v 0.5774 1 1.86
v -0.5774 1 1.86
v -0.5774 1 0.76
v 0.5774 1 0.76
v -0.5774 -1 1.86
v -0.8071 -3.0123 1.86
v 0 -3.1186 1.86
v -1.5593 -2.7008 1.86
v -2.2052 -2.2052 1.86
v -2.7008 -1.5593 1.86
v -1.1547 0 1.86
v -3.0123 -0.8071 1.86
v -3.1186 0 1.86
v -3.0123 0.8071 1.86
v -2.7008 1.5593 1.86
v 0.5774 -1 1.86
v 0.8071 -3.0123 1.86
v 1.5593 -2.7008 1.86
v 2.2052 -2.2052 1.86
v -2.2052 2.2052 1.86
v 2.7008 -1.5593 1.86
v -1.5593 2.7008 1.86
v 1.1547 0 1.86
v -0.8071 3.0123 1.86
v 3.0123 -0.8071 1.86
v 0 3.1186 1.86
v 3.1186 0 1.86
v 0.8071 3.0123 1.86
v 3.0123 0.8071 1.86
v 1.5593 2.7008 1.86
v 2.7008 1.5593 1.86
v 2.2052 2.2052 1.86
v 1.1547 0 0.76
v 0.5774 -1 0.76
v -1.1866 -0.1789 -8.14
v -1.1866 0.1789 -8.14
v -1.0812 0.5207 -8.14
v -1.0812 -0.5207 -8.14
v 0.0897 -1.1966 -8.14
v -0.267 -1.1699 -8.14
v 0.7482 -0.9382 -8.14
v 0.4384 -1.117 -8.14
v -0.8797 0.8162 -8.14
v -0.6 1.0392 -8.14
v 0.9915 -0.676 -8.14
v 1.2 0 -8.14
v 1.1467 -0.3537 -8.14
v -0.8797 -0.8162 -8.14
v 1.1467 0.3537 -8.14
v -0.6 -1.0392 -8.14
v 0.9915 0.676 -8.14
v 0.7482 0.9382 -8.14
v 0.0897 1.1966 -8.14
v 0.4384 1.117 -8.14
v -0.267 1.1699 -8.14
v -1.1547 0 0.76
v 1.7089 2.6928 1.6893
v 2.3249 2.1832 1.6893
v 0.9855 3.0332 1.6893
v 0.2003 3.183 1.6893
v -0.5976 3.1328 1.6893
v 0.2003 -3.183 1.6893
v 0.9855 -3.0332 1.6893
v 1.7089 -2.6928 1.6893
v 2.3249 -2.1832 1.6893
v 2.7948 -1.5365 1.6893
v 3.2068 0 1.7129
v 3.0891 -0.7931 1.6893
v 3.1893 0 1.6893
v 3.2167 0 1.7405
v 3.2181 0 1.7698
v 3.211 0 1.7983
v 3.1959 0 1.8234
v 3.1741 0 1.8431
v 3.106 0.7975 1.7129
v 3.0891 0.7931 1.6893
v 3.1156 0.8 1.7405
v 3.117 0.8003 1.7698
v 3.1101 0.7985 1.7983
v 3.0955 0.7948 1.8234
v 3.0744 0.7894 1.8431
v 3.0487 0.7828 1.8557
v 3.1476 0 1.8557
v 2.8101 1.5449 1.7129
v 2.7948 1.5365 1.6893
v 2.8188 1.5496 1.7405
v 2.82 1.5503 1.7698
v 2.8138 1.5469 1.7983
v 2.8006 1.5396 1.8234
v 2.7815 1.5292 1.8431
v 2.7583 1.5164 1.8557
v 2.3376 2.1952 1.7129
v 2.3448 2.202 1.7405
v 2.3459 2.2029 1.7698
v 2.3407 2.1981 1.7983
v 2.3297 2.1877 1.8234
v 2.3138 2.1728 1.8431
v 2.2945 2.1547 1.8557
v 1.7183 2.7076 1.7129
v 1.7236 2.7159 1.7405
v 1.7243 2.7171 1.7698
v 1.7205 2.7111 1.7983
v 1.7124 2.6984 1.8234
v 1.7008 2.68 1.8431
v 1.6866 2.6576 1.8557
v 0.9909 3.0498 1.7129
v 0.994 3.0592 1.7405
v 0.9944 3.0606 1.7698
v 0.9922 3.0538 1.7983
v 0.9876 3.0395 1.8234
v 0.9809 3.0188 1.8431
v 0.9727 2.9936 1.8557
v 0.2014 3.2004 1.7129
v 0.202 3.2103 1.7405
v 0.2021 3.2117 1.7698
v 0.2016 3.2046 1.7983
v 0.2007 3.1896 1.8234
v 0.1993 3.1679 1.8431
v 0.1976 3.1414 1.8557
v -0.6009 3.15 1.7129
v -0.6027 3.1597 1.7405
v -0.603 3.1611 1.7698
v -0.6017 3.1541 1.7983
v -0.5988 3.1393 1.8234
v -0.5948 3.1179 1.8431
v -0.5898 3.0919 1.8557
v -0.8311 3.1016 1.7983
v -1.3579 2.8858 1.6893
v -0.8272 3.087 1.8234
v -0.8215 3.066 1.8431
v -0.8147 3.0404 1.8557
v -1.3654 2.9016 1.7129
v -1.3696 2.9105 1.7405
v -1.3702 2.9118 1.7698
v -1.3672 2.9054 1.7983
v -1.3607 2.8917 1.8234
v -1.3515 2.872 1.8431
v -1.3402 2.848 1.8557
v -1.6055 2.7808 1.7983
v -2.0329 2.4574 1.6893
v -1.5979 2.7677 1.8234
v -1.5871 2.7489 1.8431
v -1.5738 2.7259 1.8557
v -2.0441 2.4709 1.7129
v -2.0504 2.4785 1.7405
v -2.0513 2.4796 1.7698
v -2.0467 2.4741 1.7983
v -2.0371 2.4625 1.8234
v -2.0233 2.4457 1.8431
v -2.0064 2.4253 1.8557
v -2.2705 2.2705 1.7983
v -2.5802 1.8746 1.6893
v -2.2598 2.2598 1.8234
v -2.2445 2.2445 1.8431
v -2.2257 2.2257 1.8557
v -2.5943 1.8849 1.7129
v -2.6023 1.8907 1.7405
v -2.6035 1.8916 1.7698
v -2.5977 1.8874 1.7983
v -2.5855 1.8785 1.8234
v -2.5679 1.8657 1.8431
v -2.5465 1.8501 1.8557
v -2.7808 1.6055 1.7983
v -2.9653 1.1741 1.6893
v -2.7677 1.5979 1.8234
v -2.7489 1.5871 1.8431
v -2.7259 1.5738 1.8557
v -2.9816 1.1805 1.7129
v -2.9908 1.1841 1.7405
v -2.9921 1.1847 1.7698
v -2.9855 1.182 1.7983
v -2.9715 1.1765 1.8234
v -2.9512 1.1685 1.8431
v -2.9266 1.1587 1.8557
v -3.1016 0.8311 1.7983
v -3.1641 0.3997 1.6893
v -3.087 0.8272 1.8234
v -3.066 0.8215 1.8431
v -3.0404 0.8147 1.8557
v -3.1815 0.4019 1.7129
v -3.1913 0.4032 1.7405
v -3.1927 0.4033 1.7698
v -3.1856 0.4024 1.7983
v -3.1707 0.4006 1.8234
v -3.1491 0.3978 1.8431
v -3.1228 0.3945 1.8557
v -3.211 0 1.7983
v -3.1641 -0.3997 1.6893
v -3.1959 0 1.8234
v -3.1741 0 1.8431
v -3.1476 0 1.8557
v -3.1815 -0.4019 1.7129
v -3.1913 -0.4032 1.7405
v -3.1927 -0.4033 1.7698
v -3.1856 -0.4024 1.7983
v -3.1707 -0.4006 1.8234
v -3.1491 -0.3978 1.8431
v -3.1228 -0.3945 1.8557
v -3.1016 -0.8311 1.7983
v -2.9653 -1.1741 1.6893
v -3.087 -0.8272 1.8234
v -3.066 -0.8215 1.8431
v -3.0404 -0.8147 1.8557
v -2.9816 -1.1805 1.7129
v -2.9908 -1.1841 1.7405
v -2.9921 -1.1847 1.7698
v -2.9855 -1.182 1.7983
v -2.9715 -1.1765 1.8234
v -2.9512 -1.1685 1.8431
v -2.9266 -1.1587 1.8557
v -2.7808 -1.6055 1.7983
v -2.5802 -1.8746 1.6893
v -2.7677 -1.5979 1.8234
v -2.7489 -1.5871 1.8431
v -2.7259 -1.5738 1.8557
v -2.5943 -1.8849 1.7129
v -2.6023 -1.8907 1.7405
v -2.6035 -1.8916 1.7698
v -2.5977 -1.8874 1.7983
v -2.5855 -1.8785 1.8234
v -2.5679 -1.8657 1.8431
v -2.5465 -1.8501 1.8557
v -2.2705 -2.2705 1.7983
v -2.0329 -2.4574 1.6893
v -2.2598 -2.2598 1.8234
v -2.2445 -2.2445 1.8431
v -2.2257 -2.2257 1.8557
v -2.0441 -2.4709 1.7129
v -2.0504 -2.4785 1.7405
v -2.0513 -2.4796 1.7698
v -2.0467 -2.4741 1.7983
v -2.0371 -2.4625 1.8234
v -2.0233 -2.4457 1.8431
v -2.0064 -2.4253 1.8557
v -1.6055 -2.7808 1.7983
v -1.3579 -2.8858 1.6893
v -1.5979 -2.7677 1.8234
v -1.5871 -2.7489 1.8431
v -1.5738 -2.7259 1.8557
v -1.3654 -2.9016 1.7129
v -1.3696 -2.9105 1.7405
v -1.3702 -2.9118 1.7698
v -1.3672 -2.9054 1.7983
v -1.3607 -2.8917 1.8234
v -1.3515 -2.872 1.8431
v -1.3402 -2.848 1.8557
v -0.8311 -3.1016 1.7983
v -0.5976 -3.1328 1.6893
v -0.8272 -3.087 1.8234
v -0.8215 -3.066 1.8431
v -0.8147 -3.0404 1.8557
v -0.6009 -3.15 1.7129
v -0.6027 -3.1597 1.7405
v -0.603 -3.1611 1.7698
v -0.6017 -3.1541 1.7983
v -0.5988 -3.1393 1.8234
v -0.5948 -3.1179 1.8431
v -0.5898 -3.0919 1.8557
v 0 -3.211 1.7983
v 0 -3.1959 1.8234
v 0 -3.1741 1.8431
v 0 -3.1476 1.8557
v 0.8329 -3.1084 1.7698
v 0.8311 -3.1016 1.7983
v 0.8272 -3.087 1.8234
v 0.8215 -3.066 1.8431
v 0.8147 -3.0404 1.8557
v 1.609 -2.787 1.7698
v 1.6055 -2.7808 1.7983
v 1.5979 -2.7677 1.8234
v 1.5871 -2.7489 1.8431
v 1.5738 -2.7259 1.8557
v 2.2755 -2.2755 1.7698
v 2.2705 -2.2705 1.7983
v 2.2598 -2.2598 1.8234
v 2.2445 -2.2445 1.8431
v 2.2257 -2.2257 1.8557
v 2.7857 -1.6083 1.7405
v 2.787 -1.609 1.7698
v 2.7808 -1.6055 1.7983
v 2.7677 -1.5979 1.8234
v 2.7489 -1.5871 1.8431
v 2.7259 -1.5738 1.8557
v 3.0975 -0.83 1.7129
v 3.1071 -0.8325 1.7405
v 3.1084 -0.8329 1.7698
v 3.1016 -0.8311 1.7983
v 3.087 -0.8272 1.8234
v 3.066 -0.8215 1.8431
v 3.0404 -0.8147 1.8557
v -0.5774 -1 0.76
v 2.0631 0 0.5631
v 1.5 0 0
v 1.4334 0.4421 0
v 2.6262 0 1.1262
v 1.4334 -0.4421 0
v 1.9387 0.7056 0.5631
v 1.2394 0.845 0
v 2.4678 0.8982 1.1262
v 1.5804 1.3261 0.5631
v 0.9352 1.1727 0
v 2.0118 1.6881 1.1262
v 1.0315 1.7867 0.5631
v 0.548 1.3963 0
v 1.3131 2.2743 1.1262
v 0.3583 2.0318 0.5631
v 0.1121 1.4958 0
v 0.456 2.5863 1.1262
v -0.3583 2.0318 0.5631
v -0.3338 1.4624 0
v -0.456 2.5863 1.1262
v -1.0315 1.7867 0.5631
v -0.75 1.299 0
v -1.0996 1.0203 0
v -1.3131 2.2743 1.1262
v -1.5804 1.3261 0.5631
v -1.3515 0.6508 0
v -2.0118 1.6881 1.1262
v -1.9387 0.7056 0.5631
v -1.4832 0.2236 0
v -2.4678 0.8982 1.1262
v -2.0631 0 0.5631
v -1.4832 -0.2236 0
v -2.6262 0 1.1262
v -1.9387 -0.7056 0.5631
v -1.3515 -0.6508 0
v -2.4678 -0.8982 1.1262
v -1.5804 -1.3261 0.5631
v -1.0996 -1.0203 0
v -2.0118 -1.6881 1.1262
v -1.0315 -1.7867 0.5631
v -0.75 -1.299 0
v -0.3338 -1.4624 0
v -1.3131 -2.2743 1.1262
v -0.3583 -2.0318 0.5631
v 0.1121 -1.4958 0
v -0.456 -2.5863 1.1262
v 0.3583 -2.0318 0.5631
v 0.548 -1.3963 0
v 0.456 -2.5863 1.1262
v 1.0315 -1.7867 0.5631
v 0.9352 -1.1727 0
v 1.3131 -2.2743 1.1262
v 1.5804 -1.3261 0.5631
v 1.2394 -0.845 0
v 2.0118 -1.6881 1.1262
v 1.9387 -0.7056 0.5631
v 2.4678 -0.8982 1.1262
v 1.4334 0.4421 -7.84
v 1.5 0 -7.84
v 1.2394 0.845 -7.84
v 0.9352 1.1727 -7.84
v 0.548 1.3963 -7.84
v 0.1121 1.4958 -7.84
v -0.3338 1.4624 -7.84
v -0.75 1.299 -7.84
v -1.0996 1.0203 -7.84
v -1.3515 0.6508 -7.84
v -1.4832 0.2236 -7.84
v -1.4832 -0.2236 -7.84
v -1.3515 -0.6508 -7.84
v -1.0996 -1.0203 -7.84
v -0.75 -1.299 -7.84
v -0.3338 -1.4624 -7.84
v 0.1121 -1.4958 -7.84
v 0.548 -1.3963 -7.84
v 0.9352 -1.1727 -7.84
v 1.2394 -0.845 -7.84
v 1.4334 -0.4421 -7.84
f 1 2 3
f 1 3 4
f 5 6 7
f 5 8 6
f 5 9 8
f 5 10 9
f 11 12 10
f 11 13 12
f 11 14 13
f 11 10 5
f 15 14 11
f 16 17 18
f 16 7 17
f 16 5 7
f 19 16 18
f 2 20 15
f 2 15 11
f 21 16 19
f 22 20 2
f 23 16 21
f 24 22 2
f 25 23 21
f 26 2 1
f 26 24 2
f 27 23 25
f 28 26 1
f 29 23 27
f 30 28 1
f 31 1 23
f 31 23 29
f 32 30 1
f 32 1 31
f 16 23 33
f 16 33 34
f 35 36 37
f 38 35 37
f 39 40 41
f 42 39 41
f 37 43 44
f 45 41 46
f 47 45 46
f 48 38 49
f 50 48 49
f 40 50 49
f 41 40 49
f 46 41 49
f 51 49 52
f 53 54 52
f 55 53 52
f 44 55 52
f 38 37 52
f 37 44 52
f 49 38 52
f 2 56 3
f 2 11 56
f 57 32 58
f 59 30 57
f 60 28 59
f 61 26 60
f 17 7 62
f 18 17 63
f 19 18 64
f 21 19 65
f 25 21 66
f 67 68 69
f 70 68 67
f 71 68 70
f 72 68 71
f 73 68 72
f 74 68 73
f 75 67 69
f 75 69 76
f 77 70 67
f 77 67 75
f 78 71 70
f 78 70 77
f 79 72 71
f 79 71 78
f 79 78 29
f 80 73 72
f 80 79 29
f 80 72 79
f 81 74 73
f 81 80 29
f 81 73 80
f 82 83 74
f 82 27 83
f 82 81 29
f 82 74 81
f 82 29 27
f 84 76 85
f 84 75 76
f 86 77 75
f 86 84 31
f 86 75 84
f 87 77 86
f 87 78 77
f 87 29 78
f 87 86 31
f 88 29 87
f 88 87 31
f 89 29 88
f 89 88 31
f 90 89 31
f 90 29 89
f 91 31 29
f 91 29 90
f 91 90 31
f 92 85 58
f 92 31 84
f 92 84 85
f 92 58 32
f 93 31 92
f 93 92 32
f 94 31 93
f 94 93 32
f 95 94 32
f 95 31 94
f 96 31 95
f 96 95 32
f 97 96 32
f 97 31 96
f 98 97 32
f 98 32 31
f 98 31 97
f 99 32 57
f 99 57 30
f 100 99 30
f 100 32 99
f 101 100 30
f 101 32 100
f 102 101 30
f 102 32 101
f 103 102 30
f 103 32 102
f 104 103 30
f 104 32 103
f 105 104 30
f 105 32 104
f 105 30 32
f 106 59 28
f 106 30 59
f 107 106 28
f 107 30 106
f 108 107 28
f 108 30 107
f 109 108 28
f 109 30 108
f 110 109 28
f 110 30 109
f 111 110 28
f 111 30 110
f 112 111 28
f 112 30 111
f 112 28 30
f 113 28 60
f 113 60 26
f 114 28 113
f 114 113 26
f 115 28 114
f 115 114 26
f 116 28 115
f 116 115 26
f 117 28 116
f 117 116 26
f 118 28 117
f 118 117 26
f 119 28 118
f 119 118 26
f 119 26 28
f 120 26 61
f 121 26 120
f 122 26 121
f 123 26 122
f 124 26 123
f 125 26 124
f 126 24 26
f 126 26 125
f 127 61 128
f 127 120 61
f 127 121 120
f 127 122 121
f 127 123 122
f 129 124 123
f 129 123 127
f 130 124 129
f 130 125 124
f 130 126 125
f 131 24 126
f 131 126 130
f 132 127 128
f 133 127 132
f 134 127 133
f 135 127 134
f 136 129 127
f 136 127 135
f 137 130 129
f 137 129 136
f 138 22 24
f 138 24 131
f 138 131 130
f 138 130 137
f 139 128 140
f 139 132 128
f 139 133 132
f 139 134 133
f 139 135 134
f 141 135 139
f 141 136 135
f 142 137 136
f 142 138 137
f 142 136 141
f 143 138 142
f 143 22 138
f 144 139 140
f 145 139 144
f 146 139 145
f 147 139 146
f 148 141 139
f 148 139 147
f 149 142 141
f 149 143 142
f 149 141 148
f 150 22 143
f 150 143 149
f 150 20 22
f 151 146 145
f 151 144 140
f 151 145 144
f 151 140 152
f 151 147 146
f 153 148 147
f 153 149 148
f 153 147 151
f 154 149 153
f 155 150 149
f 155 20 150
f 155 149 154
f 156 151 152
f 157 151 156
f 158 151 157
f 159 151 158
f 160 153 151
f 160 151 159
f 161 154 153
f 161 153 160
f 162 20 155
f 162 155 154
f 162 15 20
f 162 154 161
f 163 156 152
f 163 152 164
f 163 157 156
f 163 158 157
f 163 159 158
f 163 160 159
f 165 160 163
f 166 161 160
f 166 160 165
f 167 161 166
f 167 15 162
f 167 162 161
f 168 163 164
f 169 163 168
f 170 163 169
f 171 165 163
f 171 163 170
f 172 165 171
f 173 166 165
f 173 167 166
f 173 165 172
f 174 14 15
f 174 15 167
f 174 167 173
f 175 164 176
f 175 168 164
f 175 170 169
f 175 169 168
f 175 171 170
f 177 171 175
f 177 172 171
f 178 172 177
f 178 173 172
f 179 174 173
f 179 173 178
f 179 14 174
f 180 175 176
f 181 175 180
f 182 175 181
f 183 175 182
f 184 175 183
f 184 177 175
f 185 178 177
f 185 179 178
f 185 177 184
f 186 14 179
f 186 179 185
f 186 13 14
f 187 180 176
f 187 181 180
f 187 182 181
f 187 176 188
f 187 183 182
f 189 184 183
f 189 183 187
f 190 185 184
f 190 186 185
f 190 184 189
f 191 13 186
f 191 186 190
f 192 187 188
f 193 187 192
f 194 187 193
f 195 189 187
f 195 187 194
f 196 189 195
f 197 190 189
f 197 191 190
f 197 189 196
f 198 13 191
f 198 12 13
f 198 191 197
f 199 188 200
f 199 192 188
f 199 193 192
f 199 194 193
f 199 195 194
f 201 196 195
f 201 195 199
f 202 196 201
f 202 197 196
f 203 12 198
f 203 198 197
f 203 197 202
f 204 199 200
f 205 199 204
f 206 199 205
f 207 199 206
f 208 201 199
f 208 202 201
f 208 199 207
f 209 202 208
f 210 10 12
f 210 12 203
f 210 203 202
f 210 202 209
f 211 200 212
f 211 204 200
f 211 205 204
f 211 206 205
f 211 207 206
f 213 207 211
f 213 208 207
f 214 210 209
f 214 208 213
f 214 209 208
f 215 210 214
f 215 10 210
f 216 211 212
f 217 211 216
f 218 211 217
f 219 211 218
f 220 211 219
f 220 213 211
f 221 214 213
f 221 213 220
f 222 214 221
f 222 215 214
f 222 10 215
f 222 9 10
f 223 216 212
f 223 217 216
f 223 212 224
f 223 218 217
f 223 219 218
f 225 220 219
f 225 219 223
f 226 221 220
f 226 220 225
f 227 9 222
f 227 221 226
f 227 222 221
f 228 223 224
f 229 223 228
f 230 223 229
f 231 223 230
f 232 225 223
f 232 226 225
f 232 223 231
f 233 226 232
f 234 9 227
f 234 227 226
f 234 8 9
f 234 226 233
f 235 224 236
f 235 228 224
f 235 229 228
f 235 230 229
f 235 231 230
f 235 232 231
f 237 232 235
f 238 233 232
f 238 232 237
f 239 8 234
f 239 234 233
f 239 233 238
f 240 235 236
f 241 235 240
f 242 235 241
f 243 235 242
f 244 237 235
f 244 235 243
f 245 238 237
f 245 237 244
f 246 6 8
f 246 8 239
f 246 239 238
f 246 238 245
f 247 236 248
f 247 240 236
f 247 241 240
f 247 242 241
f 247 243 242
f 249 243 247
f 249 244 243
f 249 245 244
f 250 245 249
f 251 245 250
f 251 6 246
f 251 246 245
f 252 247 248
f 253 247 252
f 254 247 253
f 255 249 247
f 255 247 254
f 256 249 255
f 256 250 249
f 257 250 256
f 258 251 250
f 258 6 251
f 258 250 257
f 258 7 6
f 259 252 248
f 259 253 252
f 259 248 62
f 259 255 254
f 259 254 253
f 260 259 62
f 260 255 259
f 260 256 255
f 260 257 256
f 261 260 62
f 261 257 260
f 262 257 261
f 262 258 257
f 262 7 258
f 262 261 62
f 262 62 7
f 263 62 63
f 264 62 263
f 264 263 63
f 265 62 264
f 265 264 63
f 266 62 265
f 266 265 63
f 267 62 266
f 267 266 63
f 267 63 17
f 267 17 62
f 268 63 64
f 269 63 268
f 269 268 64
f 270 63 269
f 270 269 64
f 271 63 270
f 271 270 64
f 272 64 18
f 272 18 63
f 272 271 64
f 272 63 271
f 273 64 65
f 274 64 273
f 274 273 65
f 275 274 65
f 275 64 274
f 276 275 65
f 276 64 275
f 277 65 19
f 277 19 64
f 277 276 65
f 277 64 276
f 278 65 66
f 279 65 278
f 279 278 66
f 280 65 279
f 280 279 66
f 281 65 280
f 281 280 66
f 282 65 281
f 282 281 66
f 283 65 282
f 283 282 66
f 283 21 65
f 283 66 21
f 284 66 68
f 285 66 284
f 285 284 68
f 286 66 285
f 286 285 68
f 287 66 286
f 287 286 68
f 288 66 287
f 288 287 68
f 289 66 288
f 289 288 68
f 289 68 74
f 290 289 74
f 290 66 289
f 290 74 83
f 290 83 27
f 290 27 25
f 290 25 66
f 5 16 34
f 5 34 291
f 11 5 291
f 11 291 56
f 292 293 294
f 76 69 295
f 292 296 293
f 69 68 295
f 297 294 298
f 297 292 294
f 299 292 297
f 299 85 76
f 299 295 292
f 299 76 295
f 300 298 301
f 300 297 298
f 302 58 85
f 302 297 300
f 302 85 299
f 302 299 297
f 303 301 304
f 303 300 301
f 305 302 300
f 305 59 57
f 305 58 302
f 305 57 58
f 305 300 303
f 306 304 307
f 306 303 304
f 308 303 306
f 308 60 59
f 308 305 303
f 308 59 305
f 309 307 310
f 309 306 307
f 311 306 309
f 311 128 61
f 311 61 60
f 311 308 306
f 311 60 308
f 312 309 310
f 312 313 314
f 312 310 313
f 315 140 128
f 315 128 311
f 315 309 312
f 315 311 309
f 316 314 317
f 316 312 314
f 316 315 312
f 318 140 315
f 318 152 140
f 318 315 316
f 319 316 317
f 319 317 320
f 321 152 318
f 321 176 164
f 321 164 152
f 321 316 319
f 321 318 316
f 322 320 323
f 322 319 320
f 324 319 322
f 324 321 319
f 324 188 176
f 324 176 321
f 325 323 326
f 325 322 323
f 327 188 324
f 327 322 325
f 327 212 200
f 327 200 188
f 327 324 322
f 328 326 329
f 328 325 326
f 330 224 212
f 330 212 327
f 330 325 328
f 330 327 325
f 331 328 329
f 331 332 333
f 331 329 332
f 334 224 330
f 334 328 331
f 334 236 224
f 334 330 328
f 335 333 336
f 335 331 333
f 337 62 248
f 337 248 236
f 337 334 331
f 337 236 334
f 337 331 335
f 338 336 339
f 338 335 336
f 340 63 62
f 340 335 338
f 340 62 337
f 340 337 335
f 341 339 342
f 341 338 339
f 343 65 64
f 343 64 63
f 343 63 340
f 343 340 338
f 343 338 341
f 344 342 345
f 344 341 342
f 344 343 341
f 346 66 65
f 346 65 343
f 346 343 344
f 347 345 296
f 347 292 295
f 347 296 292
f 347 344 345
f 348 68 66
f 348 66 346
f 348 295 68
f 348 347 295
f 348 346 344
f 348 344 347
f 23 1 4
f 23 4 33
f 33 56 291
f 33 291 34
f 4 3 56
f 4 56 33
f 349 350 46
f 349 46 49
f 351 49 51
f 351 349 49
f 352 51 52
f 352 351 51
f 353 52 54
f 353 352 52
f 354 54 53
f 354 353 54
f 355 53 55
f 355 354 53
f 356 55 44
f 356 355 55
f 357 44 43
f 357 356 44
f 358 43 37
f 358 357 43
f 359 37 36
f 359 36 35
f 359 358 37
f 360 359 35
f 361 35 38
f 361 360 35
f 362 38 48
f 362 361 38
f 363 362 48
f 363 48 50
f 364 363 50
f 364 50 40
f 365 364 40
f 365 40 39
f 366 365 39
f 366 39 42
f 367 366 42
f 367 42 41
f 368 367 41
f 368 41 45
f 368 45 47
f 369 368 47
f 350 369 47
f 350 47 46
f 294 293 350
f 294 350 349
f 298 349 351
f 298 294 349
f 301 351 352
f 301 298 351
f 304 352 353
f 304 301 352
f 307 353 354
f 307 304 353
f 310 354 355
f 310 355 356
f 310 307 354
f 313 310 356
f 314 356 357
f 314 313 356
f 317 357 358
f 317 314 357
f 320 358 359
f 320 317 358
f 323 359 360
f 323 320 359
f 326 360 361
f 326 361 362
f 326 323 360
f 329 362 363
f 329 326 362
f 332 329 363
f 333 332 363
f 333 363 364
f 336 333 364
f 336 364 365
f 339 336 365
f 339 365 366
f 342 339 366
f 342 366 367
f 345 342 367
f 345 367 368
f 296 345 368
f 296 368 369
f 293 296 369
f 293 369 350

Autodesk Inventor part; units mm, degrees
ref_plane "YZ Plane" through (0, 0, 0) normal (1, 0, 0) x (0, 1, 0)
ref_plane "XZ Plane" through (0, 0, 0) normal (0, 1, 0) x (-1, 0, 0)
ref_plane "XY Plane" through (0, 0, 0) normal (0, 0, 1) x (1, 0, 0)
sketch "Sketch2" plane through (0, 0, 0) normal (0, 0, 1) x (1, 0, 0)
  circle A0 centre (0, 0) radius 1.5
  dimension "Diameter" = 3
extrude "Extrusion1" add sketch "Sketch2" against normal blind 8.14
sketch "Sketch3" plane through (0, 0, 0) normal (0, 0, 1) x (1, 0, 0)
  circle A0 centre (0, 0) radius 1.5 projected
extrude "Extrusion2" add sketch "Sketch3" along normal blind 1.86 draft 45
sketch "Sketch4" plane through (0, 0, 1.86) normal (0, 0, 1) x (1, 0, 0)
  circle A0 centre (0, 0) radius 3.36 projected
  line L0 (0.5774, 1) -> (1.1547, 0)
  line L1 (1.1547, 0) -> (0.5774, -1)
  line L2 (0.5774, -1) -> (-0.5774, -1)
  line L3 (-0.5774, -1) -> (-1.1547, 0)
  line L4 (-1.1547, 0) -> (-0.5774, 1)
  line L5 (-0.5774, 1) -> (0.5774, 1)
  line L6 (0, 0) -> (1.1547, 0) construction
  dimension "Hex_Width" = 2
extrude "Extrusion3" cut sketch "Sketch4" against normal blind 1.1 contours L0 L1 L2 L3 L4 L5
thread "Thread1" size "M3x0.5" class "6g" standard "ANSI Metric M Profile-Short lst" length 8.14
chamfer "Chamfer1" distance 0.3 angle 45 1 edges at (-1.5, 0, -8.14)
fillet "Fillet1" radius 0.1 1 edges at (-3.36, 0, 1.86)
equation "\"Length1\" = Length - Head_Height"
equation "\"Thread_Length\" = Length1"
equation "\"Length\" = 10"
equation "\"Head_Height\" = 1.86"
properties part number "SCREW,FLAT-HD,P,10_9,M03X0_50X010MM" material "Steel, MS"
